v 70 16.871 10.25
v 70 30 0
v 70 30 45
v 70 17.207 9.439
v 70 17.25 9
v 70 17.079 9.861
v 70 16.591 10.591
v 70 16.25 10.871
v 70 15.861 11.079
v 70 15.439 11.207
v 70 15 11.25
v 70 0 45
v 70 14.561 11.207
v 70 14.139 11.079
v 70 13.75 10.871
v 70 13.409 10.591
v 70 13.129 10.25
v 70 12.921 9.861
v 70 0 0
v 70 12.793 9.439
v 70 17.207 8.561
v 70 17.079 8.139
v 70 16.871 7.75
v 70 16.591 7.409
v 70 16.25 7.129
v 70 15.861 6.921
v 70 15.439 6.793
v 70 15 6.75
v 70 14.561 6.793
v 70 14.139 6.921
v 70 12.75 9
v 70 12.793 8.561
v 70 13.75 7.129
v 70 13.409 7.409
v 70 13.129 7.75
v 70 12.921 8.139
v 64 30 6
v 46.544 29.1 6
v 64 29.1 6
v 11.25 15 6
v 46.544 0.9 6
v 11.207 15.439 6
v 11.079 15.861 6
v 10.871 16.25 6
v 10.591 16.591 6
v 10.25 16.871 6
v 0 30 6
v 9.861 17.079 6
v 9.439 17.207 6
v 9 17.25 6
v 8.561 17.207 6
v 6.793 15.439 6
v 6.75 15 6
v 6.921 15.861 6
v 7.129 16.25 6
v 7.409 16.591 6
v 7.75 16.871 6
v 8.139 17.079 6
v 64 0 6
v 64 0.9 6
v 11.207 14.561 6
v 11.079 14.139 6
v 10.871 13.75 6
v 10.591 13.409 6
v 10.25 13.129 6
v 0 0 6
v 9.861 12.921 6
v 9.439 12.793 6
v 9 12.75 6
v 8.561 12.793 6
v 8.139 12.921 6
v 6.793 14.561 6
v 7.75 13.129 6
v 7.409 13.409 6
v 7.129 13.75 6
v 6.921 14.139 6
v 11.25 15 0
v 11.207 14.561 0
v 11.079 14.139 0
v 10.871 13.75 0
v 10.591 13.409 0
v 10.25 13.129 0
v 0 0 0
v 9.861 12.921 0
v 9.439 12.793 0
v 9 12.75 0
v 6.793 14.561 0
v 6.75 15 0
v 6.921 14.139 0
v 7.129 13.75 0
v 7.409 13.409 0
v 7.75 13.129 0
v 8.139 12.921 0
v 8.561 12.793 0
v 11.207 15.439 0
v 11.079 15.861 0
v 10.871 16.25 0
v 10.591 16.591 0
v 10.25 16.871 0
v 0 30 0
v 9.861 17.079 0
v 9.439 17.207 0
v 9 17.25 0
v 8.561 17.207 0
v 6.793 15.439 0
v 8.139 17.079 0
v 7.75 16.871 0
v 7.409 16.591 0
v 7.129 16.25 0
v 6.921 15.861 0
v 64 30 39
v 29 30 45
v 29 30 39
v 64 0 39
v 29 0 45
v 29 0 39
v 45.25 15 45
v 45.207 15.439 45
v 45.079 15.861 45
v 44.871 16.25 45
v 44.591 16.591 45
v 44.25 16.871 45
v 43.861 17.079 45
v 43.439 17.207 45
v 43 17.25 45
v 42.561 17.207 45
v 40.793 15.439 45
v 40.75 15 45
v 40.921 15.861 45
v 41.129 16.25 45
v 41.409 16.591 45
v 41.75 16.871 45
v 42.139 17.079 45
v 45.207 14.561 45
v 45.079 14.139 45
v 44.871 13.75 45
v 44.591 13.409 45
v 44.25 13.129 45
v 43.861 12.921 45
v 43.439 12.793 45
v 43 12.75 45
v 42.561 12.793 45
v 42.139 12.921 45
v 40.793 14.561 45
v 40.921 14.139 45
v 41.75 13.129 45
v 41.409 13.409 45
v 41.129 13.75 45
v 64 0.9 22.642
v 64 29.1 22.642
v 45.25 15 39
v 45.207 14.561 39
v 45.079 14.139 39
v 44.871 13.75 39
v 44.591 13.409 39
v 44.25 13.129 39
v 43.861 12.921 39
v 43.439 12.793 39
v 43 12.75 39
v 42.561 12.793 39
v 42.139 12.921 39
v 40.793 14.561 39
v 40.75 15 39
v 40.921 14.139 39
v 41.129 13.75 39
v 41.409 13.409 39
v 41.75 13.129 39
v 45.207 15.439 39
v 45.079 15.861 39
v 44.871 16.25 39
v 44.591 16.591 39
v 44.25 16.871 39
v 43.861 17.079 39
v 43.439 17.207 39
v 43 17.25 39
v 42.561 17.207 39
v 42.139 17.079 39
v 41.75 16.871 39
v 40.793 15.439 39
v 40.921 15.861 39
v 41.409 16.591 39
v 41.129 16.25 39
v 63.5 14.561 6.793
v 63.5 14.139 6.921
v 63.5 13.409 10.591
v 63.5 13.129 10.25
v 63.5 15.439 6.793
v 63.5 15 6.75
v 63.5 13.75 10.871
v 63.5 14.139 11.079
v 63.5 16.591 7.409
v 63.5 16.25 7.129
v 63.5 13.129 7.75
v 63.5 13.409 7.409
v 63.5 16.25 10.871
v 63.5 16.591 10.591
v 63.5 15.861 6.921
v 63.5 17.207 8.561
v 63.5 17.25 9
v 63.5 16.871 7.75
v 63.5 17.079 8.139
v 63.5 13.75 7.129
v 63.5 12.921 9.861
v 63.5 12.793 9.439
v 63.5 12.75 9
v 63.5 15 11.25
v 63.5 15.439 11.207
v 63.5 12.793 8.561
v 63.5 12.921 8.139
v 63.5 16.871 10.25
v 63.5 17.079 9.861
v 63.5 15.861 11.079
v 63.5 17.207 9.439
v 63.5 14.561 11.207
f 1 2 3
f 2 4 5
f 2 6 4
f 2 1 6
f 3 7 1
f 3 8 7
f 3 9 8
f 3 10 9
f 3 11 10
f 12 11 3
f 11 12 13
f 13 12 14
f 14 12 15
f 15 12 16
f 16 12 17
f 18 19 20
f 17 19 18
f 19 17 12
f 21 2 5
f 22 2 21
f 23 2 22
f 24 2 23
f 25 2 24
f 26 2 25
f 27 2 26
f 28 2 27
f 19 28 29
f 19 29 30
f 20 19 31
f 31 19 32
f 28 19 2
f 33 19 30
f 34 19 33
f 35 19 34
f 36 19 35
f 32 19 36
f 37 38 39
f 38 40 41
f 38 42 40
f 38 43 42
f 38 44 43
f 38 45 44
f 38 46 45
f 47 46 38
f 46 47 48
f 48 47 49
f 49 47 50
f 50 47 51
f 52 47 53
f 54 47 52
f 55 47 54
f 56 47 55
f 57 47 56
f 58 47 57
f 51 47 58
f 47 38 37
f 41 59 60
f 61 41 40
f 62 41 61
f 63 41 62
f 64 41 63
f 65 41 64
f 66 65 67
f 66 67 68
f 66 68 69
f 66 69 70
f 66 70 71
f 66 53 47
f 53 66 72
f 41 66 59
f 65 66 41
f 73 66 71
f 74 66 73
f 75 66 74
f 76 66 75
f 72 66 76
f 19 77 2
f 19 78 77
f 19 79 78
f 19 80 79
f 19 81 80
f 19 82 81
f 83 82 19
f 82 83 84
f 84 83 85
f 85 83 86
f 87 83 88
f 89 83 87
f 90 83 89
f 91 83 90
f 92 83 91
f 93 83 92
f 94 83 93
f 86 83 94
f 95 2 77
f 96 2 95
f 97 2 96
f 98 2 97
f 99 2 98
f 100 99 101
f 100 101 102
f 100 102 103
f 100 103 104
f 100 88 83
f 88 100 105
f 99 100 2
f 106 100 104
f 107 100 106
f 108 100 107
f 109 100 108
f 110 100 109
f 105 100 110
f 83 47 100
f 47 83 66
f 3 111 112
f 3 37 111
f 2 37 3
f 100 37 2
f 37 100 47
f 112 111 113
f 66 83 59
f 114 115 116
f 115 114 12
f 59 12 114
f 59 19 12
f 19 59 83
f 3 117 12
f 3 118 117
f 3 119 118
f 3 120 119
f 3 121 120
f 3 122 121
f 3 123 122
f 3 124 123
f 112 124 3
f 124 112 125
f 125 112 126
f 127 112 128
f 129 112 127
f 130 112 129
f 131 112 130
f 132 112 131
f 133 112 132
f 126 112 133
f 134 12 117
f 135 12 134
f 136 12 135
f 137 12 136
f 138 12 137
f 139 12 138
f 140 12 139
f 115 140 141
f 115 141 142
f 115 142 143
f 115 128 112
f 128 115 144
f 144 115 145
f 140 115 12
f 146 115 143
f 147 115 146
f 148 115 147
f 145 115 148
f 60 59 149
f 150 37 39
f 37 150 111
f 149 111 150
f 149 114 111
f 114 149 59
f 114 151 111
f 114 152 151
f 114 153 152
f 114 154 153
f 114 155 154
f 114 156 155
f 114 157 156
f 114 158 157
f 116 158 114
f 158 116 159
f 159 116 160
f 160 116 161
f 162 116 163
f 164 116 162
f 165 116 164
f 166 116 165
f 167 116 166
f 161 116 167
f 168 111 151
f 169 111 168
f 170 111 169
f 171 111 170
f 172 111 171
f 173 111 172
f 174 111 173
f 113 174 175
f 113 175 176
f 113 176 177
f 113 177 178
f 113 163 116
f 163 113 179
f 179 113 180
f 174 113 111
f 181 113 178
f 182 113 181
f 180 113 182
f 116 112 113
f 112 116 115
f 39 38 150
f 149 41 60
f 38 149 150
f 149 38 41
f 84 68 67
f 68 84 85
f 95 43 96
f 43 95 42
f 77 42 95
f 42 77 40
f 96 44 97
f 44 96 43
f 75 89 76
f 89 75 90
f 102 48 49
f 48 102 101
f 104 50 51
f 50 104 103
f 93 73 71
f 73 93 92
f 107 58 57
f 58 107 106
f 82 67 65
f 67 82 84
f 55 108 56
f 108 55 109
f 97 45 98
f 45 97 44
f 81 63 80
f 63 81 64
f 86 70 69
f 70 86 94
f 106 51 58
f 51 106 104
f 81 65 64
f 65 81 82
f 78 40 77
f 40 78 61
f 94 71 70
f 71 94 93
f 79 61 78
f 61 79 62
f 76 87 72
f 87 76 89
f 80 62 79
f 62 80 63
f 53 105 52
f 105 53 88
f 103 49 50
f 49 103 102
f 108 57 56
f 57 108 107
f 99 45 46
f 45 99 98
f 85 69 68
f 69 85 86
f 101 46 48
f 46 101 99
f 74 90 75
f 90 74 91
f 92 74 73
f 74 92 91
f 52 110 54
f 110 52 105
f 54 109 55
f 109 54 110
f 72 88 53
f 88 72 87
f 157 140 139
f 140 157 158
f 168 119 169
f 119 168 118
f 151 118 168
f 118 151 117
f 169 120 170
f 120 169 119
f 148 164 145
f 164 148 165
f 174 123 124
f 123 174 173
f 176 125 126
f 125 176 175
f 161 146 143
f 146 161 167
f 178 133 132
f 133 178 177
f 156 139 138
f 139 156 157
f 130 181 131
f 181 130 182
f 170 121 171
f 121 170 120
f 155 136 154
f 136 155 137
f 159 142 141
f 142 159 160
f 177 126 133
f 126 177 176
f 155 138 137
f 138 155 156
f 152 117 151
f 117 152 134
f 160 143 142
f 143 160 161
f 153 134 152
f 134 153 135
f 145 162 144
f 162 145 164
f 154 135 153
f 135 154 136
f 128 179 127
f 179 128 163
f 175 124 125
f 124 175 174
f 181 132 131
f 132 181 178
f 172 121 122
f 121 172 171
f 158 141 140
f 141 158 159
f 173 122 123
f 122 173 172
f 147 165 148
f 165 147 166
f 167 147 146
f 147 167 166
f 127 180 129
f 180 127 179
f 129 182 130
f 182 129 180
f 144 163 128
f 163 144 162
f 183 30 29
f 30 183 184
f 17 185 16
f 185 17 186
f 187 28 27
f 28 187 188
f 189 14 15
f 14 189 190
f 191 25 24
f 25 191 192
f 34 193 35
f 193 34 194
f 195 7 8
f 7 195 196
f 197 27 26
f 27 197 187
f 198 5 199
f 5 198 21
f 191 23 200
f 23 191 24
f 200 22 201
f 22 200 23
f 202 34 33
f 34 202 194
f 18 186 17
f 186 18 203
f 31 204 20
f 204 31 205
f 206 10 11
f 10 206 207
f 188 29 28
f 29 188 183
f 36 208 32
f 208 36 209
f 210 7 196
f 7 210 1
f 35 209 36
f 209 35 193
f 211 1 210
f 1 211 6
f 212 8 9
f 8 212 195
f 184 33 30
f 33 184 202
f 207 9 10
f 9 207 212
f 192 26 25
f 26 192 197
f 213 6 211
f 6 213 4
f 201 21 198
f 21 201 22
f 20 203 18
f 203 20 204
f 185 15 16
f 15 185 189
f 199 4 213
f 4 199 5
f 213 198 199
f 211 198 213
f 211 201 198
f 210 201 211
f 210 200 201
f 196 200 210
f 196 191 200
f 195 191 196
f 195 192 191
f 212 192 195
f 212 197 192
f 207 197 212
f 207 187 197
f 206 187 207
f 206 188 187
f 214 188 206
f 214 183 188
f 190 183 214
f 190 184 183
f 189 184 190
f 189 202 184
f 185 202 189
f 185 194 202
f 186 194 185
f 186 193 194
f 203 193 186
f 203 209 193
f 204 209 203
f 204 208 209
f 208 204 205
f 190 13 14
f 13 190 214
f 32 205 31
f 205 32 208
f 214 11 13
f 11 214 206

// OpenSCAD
$fn = 32;

// ----------------------------------------------------------------------
// Z-bracket: 70 x 30 x 45 mm
// ----------------------------------------------------------------------

// --- parameters (mm) ---
foot_len = 70;            // lower foot length, X
top_len = 35;             // upper foot length, X
depth = 30;               // bracket width, Y
step_h = 45;              // overall rise, Z
plate_t = 6;              // plate thickness
hole_d = 4.5;             // clearance for M4
rib_len = 18.4;           // gusset leg
rib_sink = 0.9;           // gusset overlap into the plates

module hole_z(px, py, z0) {
  translate([px, py, z0 - 0.5]) cylinder(h = plate_t + 1, d = hole_d);
}
module hole_x(py, pz) {
  translate([-0.5, py, pz]) rotate([0, 90, 0]) cylinder(h = plate_t + 1, d = hole_d);
}
module gusset(x0) {
  translate([x0, depth - rib_sink, 0])
    rotate([90, 0, 0])
      linear_extrude(height = depth - 2 * rib_sink)
        polygon(points = [[rib_sink, plate_t - rib_sink],
                          [rib_sink, plate_t - rib_sink + rib_len],
                          [-rib_len, plate_t - rib_sink]]);
}

difference() {
  union() {
    cube([foot_len, depth, plate_t]);
    /* web, overlapping the lower foot */
    translate([foot_len - plate_t, 0, 0]) cube([plate_t, depth, step_h]);
    /* upper foot, sunk into the web */
    translate([foot_len - plate_t - top_len, 0, step_h - plate_t]) cube([top_len + plate_t, depth, plate_t]);
    gusset(foot_len - plate_t);
  }
  hole_z(9, 15, 0);
  translate([foot_len - plate_t - 21, 0, 0]) hole_z(0, 15, step_h - plate_t);
  translate([foot_len - plate_t, 0, 0]) hole_x(15, 9);
}
